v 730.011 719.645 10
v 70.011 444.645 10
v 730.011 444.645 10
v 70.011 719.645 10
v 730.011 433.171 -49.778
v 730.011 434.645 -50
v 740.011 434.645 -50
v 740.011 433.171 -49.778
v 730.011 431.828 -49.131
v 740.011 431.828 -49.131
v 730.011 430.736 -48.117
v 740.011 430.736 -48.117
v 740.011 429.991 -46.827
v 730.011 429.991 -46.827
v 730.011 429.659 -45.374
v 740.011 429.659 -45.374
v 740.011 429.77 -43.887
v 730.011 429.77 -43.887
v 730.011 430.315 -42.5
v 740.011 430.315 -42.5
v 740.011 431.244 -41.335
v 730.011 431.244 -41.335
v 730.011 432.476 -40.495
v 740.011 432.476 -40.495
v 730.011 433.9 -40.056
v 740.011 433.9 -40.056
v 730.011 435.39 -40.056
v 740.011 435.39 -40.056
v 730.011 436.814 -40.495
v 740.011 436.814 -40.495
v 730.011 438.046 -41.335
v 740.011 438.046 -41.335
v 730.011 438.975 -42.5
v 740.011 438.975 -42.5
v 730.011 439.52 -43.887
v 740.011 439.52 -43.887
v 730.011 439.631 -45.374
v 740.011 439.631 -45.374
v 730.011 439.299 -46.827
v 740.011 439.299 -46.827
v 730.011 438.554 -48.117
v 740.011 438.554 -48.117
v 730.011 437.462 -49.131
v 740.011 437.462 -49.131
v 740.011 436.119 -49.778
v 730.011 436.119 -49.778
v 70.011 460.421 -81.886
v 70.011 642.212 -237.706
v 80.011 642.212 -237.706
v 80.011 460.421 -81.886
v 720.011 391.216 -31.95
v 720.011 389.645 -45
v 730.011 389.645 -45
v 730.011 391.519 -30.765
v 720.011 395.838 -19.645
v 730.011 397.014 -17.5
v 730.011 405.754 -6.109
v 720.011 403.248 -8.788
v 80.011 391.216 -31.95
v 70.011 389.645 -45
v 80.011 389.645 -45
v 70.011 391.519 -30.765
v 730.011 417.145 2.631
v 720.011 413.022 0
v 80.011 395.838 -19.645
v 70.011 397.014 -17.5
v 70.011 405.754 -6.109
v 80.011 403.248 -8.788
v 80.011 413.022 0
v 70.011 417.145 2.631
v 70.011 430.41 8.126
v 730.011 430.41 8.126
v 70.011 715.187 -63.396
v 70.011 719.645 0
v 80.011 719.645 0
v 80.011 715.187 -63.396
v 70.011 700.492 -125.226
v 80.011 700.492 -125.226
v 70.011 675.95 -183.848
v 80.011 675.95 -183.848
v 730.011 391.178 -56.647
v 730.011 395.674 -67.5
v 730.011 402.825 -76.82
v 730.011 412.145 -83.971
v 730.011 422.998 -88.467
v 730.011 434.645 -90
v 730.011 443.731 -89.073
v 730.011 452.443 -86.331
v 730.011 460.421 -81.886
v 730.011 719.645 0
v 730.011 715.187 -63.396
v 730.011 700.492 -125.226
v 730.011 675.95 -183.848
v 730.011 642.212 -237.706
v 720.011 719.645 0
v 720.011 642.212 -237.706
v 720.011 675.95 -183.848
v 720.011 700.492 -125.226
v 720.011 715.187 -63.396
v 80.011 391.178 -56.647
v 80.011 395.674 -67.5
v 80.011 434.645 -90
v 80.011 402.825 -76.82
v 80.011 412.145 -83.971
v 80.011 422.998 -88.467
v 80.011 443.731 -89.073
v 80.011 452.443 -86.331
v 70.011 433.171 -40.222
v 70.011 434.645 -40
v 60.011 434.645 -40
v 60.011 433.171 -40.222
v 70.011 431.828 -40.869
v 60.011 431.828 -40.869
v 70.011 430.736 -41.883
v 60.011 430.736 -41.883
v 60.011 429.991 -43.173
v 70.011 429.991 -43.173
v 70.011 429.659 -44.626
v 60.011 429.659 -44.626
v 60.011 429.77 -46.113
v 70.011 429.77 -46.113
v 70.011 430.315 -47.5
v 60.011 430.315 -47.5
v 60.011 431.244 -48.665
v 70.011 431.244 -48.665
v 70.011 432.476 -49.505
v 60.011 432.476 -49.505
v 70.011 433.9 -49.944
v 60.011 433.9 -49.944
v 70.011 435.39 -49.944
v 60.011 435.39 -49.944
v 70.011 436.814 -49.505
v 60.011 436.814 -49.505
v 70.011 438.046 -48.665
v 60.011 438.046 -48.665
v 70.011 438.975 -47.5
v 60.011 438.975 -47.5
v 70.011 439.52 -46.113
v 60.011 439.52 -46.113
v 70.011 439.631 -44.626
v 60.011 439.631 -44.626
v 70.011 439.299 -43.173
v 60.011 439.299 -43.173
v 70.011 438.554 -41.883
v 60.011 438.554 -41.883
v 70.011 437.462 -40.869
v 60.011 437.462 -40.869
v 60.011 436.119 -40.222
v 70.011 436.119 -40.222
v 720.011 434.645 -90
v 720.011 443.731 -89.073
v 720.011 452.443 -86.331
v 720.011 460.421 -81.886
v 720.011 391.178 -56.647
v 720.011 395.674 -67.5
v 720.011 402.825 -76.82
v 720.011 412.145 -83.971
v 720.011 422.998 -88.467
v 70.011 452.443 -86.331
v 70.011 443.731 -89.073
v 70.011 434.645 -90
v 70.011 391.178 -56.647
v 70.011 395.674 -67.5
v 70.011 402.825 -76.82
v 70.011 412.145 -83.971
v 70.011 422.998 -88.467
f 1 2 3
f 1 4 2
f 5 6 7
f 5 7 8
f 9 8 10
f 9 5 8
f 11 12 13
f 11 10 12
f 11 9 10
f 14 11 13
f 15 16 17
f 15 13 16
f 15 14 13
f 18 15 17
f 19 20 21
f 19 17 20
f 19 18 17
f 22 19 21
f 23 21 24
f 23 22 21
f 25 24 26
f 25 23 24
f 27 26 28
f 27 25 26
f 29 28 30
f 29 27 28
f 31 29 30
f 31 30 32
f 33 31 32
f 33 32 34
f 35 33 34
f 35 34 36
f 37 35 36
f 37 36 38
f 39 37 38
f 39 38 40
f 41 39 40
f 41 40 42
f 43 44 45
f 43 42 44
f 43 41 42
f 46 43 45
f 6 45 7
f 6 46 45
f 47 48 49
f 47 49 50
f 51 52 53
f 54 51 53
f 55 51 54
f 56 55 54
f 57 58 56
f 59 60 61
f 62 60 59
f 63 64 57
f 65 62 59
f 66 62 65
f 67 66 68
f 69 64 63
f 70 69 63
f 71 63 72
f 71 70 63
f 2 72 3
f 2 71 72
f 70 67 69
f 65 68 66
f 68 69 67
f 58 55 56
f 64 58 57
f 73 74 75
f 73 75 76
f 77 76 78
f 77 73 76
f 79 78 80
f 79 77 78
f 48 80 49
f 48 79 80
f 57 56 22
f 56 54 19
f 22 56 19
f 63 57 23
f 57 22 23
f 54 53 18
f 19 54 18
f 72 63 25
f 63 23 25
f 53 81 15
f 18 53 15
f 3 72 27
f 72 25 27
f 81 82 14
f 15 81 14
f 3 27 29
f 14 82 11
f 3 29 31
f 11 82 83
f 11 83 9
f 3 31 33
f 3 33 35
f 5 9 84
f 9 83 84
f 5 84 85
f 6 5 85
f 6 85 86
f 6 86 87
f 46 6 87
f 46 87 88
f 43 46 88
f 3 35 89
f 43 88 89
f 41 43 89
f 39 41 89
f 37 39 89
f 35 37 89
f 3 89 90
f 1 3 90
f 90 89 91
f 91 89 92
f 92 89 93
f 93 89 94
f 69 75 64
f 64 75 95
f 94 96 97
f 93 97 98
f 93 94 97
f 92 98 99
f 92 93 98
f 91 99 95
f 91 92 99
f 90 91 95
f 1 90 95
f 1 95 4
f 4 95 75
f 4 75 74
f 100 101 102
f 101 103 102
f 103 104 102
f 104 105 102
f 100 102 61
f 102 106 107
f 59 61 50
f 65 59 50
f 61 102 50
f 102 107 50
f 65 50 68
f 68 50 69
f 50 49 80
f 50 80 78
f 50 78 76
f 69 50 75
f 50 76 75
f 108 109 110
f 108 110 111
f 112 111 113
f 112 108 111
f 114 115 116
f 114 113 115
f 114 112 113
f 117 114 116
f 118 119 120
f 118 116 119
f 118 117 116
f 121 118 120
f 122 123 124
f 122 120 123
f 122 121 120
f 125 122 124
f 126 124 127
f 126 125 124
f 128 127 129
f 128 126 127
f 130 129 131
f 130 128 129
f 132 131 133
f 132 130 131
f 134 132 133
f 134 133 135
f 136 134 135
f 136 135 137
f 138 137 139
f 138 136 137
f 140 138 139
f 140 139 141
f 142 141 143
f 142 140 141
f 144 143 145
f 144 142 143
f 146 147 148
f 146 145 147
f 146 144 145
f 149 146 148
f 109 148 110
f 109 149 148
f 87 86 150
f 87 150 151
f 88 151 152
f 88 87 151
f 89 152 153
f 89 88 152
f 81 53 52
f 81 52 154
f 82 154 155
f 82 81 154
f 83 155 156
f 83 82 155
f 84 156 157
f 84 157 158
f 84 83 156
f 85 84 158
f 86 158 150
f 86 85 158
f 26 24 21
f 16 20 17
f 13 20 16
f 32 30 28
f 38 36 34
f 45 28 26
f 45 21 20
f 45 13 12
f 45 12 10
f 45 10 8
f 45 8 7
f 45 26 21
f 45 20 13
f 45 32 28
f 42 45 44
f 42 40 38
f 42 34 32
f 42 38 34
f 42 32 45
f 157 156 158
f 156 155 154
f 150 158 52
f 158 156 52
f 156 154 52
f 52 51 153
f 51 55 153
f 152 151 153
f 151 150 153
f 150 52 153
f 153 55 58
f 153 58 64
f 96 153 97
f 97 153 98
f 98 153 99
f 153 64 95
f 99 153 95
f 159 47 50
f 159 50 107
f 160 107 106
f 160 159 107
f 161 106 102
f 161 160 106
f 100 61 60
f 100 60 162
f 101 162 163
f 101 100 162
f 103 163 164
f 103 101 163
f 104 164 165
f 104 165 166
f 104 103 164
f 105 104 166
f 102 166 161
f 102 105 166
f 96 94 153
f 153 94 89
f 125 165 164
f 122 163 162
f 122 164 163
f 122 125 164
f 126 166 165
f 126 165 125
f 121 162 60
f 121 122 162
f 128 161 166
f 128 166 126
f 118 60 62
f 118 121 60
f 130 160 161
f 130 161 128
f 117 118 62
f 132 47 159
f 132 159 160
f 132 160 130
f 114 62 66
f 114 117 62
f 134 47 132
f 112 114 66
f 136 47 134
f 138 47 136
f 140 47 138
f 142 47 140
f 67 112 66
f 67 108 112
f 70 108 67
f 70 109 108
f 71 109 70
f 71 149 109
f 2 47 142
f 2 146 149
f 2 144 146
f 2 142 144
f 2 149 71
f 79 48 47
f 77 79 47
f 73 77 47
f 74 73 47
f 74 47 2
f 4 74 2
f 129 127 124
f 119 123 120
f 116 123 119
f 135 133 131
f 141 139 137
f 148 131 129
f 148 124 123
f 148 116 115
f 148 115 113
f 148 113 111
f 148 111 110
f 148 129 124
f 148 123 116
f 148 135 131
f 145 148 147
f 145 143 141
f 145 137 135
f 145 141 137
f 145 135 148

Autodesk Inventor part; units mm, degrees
ref_plane "YZ Plane" through (0, 0, 0) normal (1, 0, 0) x (0, 1, 0)
ref_plane "XZ Plane" through (0, 0, 0) normal (0, 1, 0) x (-1, 0, 0)
ref_plane "XY Plane" through (0, 0, 0) normal (0, 0, 1) x (1, 0, 0)
ref_plane "작업 평면1" through (0, 0.7157, 0) normal (0, 0, 1) x (1, 0, 0)
sketch "스케치1" plane through (0, 0.7157, 0) normal (0, 0, 1) x (1, 0, 0)
  line L0 (70.0112, 388.9292) -> (730.0112, 388.9292)
  line L1 (730.0112, 388.9292) -> (730.0112, 718.9292)
  line L2 (730.0112, 718.9292) -> (70.0112, 718.9292)
  line L3 (70.0112, 718.9292) -> (70.0112, 388.9292)
  point P0 (0, -0.7157)
  dimension "d0" = 660
  dimension "d1" = 330
extrude "돌출1" add sketch "스케치1" along normal blind 10
sketch "스케치2" plane through (0, 0.7157, 0) normal (0, 0, -1) x (-1, 0, 0)
  line L0 (-70.0112, 388.9292) -> (-730.0112, 388.9292) projected
  line L1 (-730.0112, 388.9292) -> (-720.0112, 388.9292)
  line L2 (-720.0112, 388.9292) -> (-720.0112, 478.9292)
  line L3 (-720.0112, 478.9292) -> (-730.0112, 478.9292)
  line L4 (-730.0112, 478.9292) -> (-730.0112, 388.9292)
  line L5 (-70.0112, 388.9292) -> (-80.0112, 388.9292)
  line L6 (-80.0112, 388.9292) -> (-80.0112, 478.9292)
  line L7 (-80.0112, 478.9292) -> (-70.0112, 478.9292)
  line L8 (-70.0112, 478.9292) -> (-70.0112, 388.9292)
  point P0 (0, -0.7157)
  dimension "d4" = 10
  dimension "d5" = 90
  dimension "d6" = 10
  dimension "d7" = 90
extrude "돌출2" add sketch "스케치2" along normal blind 90
fillet "모깎기1" radius 45 4 edges at (725.0112, 479.645, -90) (725.0112, 389.645, -90) (75.0112, 479.645, -90) (75.0112, 389.645, -90)
fillet "모깎기2" radius 55 1 edges at (400.0112, 389.645, 10)
sketch "스케치3" plane through (730.0112, 719.645, 10) normal (1, 0, 0) x (0, 0, -1)
  line L0 (10, -240) -> (10, 0) projected
  arc A0 (247.7061, -77.4327) -> (10, 0) centre (14.4307, -389.9748) ccw
  line L1 (10, 0) -> (10, -240)
  line L2 (247.7061, -77.4327) -> (91.8862, -259.2239)
  arc A1 (55, -330) -> (55, -240) centre (55, -285) ccw projected
  line L3 (10, -240) -> (55, -240) projected
  line L4 (10, -240) -> (55, -240)
  arc A2 (91.8862, -259.2239) -> (55, -240) centre (55, -285) ccw
  point P0 (10, -719.645)
  dimension "d12" = 250
  dimension "d13" = 390
extrude "돌출3" add sketch "스케치3" against normal blind 10
sketch "스케치4" plane through (70.0112, 719.645, 0) normal (-1, 0, 0) x (0, 0, 1)
  line L0 (-237.7061, -77.4327) -> (-81.8862, -259.2239) projected
  line L1 (-237.7061, -77.4327) -> (-81.8862, -259.2239)
  line L2 (0, 0) -> (10, 0) projected
  arc A0 (0, 0) -> (-237.7061, -77.4327) centre (-4.4307, -389.9748) ccw
  line L3 (0, 0) -> (0, -240) projected
  line L4 (0, 0) -> (0, -240)
  arc A1 (-45, -240) -> (-45, -330) centre (-45, -285) ccw projected
  line L5 (0, -240) -> (-45, -240)
  arc A2 (-45, -240) -> (-81.8862, -259.2239) centre (-45, -285) ccw
  point P0 (0, -719.645)
extrude "돌출4" add sketch "스케치4" against normal blind 10
sketch "스케치5" plane through (730.0112, 444.645, 10) normal (1, 0, 0) x (0, 0, -1)
  arc A0 (55, -55) -> (91.8862, 15.7761) centre (55, -10) ccw projected
  circle A1 centre (55, -10) radius 5
  point P0 (10, -444.645)
  dimension "d18" = 10
extrude "돌출5" add sketch "스케치5" along normal blind 10
sketch "스케치6" plane through (70.0112, 444.645, 10) normal (-1, 0, 0) x (0, 0, 1)
  arc A0 (-91.8862, 15.7761) -> (-55, -55) centre (-55, -10) ccw projected
  circle A1 centre (-55, -10) radius 5
  point P0 (-10, -444.645)
extrude "돌출6" add sketch "스케치6" along normal blind 10
properties part number "앞문"
